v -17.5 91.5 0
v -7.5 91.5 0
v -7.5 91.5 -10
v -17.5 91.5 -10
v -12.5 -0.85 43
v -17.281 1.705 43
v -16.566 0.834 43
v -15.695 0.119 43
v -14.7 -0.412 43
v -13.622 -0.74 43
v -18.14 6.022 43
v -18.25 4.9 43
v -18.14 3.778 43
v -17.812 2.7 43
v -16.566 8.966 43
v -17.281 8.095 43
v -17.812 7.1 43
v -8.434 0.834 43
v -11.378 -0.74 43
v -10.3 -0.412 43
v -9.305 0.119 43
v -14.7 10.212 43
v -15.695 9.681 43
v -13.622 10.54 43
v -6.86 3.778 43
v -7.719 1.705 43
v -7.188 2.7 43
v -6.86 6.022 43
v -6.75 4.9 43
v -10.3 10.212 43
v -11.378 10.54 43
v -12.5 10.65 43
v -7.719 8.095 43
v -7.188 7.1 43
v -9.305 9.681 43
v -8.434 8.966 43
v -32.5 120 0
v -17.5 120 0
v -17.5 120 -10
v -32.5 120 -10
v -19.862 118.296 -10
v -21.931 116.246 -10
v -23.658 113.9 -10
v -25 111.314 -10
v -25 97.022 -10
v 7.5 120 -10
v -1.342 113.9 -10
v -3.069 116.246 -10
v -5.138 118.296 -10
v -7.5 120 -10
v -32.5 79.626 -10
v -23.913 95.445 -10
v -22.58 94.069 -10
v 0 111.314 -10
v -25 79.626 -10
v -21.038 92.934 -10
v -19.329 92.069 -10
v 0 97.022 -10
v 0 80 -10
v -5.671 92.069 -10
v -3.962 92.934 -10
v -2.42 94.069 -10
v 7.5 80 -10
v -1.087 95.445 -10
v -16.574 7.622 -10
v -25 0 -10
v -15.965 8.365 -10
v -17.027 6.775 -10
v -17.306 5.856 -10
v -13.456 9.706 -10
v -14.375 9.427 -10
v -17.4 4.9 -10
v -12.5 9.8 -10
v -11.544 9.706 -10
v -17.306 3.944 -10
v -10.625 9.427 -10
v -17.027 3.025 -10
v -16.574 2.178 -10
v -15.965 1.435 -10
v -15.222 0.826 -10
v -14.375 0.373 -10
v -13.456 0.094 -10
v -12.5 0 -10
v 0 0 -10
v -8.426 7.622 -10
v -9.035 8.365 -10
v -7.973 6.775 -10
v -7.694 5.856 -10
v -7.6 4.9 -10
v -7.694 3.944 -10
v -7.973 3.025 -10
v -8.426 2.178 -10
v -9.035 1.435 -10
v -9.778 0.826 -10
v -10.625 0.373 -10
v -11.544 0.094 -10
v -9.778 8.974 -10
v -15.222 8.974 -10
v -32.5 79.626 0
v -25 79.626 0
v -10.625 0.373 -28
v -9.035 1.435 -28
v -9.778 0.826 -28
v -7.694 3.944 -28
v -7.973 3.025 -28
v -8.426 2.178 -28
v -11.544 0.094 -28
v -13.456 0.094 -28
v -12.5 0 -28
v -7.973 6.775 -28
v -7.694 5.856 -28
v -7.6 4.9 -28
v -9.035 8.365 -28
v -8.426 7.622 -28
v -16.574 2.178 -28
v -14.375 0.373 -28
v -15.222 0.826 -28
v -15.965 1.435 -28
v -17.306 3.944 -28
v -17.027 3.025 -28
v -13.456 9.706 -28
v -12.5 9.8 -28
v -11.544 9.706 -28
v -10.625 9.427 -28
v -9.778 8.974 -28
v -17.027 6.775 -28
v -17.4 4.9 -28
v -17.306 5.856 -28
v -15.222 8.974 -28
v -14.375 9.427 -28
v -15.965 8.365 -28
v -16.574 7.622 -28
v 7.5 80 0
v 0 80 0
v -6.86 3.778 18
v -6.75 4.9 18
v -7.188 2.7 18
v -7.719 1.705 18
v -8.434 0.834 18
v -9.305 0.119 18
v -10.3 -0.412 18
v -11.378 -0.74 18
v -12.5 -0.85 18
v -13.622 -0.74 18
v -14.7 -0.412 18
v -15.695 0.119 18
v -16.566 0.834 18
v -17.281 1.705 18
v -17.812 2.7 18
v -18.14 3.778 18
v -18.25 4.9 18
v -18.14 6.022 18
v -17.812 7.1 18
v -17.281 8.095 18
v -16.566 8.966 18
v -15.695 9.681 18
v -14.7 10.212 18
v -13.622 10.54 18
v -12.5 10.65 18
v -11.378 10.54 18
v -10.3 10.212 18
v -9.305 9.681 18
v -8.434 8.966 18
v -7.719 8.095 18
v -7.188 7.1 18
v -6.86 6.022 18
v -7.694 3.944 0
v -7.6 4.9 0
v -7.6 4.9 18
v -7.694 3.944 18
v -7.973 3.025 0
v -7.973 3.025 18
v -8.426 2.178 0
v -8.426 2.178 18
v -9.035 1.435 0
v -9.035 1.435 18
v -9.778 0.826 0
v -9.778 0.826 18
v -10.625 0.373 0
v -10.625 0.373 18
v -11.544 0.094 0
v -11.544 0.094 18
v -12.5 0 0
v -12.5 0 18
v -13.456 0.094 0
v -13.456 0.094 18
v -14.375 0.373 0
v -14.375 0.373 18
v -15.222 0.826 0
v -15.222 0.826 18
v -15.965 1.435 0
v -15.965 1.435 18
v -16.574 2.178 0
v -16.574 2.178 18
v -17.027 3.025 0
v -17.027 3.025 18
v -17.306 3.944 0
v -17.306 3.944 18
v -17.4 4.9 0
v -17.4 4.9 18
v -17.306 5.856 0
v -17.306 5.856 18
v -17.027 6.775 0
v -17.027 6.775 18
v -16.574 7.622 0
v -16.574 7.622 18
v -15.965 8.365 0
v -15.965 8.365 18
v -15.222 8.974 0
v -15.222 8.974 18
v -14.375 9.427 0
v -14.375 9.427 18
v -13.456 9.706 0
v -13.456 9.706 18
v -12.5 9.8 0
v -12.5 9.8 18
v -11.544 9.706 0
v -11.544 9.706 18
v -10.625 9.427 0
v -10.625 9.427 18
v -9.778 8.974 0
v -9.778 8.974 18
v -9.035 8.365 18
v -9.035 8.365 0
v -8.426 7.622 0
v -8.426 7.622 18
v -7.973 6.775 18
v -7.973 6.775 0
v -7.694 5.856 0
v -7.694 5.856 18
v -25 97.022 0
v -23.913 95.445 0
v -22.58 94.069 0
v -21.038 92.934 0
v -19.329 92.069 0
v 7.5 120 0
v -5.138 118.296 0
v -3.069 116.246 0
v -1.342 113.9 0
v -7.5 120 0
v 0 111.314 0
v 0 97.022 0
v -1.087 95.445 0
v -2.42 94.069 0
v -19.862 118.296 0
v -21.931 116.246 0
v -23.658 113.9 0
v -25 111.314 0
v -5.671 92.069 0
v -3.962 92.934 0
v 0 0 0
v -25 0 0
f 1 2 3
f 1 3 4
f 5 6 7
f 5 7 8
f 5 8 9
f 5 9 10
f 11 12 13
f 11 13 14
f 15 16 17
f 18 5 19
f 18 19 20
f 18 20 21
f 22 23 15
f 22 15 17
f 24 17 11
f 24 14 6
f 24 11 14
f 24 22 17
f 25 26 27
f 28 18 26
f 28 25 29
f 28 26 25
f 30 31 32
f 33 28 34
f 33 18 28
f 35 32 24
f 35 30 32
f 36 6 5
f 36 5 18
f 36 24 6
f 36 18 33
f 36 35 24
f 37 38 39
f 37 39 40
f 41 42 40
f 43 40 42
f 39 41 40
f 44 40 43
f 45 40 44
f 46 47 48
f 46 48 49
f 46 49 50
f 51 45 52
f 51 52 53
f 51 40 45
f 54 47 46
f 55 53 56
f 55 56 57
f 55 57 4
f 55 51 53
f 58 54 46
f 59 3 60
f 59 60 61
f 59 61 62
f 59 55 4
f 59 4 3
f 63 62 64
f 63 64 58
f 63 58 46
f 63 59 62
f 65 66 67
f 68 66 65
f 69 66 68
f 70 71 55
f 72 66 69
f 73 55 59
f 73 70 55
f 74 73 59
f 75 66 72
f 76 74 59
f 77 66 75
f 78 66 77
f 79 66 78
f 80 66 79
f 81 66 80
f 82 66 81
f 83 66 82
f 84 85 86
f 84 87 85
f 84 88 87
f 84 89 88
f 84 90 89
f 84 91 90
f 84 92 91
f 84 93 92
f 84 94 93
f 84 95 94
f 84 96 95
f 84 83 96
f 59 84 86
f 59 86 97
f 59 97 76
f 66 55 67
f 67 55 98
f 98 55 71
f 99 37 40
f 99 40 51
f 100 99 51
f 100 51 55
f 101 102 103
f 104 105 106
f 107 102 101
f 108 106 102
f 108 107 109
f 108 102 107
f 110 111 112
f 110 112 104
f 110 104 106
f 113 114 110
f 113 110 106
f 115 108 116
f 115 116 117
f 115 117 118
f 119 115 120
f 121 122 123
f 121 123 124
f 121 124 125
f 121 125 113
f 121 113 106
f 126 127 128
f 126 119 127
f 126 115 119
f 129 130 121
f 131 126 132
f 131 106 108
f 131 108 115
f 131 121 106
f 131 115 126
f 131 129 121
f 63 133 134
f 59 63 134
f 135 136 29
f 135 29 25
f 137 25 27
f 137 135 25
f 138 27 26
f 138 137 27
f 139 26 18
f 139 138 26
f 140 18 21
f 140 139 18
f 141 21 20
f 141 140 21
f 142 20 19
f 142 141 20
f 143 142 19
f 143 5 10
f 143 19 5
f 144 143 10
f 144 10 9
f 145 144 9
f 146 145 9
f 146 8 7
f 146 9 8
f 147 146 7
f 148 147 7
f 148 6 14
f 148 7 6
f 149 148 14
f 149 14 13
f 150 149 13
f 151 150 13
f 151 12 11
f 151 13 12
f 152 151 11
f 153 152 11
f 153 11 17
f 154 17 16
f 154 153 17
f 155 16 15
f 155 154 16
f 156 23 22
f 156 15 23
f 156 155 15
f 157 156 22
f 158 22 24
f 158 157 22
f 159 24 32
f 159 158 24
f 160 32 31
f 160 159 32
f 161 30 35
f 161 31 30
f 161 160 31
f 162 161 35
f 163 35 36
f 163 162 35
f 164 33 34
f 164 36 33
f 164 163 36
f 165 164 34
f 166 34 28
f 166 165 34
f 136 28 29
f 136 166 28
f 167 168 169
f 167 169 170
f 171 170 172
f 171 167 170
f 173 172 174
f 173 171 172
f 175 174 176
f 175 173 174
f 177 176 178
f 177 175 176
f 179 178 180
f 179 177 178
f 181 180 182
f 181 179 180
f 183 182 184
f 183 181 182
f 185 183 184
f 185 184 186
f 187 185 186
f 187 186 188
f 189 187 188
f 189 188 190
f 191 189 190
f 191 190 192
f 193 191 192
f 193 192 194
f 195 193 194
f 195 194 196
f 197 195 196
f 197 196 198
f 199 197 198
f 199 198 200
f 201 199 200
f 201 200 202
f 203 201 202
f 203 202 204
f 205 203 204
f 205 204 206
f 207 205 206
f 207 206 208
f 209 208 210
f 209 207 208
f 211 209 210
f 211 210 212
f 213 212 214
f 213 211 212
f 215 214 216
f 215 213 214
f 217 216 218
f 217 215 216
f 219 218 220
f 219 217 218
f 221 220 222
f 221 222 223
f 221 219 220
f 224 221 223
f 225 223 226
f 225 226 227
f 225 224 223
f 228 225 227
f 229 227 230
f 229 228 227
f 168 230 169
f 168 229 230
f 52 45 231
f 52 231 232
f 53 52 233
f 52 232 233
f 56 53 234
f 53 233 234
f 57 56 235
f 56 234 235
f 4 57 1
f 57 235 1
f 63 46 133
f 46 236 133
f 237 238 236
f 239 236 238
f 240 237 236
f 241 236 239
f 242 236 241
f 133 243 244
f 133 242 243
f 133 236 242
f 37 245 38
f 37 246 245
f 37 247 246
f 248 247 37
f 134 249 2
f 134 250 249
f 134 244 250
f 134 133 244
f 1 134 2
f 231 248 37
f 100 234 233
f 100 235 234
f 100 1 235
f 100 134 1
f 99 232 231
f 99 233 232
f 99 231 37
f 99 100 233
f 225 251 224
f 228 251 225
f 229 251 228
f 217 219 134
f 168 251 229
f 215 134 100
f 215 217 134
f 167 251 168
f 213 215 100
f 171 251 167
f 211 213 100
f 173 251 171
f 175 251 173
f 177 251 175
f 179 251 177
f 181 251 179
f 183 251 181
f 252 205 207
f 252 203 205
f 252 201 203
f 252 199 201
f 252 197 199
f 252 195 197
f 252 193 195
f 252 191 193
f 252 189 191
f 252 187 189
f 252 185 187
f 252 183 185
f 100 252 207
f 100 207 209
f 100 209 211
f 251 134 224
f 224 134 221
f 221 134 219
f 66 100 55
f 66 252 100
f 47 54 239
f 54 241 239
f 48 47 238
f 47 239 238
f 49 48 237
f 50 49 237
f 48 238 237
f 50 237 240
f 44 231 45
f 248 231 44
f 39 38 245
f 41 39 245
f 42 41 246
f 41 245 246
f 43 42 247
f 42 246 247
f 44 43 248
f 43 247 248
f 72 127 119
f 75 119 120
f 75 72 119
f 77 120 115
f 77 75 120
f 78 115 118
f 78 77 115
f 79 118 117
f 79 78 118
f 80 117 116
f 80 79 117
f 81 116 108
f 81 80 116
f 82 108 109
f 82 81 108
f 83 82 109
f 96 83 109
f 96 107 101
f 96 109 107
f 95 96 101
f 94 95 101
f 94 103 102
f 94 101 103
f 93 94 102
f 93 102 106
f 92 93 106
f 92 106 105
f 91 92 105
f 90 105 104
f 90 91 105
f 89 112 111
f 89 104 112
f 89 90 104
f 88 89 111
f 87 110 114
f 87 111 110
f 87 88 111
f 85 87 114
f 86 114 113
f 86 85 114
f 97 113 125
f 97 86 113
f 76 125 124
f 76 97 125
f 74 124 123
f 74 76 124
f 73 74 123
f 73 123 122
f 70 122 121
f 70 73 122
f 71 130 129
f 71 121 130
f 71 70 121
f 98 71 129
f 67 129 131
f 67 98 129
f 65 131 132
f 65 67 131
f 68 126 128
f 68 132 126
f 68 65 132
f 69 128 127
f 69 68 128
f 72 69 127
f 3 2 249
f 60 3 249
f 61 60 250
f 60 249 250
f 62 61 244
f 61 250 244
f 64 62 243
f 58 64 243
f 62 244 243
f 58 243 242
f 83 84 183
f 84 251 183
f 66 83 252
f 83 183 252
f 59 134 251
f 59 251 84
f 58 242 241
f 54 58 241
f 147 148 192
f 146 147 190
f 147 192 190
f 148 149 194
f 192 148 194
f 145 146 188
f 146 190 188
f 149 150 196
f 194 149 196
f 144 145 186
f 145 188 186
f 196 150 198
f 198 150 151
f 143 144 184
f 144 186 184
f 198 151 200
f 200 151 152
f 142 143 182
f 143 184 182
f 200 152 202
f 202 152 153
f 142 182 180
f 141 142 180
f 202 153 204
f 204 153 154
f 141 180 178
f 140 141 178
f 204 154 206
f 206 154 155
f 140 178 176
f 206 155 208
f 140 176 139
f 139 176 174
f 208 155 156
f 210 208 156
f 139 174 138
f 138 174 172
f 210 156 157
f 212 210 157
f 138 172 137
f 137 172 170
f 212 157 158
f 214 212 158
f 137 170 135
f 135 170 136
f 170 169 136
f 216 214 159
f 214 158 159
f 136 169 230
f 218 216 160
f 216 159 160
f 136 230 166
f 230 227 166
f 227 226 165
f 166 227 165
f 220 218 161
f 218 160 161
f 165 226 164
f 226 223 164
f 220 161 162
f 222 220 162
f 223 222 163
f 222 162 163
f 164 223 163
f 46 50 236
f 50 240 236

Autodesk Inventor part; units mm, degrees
ref_plane "YZ Plane" through (0, 0, 0) normal (1, 0, 0) x (0, 1, 0)
ref_plane "XZ Plane" through (0, 0, 0) normal (0, 1, 0) x (-1, 0, 0)
ref_plane "XY Plane" through (0, 0, 0) normal (0, 0, 1) x (1, 0, 0)
sketch "Sketch1" plane through (0, 0, 0) normal (0, 1, 0) x (-1, 0, 0)
  line L0 (0, 0) -> (0, -10)
  line L1 (0, 0) -> (25, 0)
  line L2 (25, 0) -> (25, -10)
  line L3 (25, -10) -> (0, -10)
  dimension "d0" = 10
  dimension "d1" = 25
  dimension "d2" = 10
extrude "Extrusion1" add sketch "Sketch1" along normal blind 120
sketch "Sketch2" plane through (-25, 0, 0) normal (0, 0, 1) x (1, 0, 0)
  line L0 (25, 0) -> (0, 0) projected
  line L1 (12.5, 0) -> (17.5, 0)
  line L2 (17.5, 0) -> (12.5, 0)
  line L3 (12.5, 0) -> (12.5, 4.9)
  circle A0 centre (12.5, 4.9) radius 4.9
  dimension "d5" = 5
  dimension "d6" = 4.9
extrude "Extrusion2" add sketch "Sketch2" along normal blind 18
sketch "Sketch3" plane through (-25, 120, 0) normal (0, 0, 1) x (1, 0, 0)
  line L0 (12.5, -120) -> (20.5, -120)
  line L1 (12.5, -120) -> (25, -120) projected
  dimension "d9" = 8
sketch "Sketch4" plane through (0, 0, 0) normal (1, 0, 0) x (0, 0, -1)
  point P0 (0, 0)
sketch "Sketch5" plane through (0, 0, 0) normal (1, 0, 0) x (0, 0, -1)
  point P0 (0, 0)
sketch "Sketch6" plane through (0, 0, 0) normal (1, 0, 0) x (0, 0, -1)
  point P0 (0, 0)
sketch "Sketch7" plane through (0, 0, 0) normal (1, 0, 0) x (0, 0, -1)
  point P0 (0, 0)
sketch "Sketch8" plane through (0, 0, -10) normal (0, 0, -1) x (-1, 0, 0)
  circle A0 centre (12.5, 4.9) radius 4.9 projected
  circle A1 centre (12.5, 4.9) radius 4.9
  point P0 (0, 0)
  point P1 (12.5, 0)
extrude "Extrusion3" add sketch "Sketch8" along normal blind 18
sketch "Sketch9" plane through (-12.5, 4.9, 18) normal (0, 0, 1) x (1, 0, 0)
  circle A0 centre (0, 0) radius 5.75
  point P0 (12.5, -4.9)
  dimension "d12" = 11.5
extrude "Extrusion4" add sketch "Sketch9" along normal blind 25
sketch "Sketch10" plane through (-25, 120, 0) normal (0, 0, 1) x (1, 0, 0)
  line L0 (0, 0) -> (25, 0) projected
  line L1 (12.5, 0) -> (12.5, -28.5)
  line L2 (12.5, -28.5) -> (-0.5, -28.5)
  line L3 (-0.5, -28.5) -> (12.5, -28.5)
  line L4 (12.5, -28.5) -> (25.5, -28.5)
  line L5 (25.5, -28.5) -> (25.5, 0)
  line L6 (25.5, 0) -> (-0.5, 0)
  line L7 (-0.5, 0) -> (-0.5, -28.5)
  line L8 (12.5, 0) -> (7.5, 0)
  line L9 (7.5, 0) -> (17.5, 0)
  line L10 (25.5, 0) -> (25.5, -10)
  line L11 (25.5, -10) -> (25.5, -22)
  line L12 (-0.5, 0) -> (-0.5, -10)
  line L13 (-0.5, -10) -> (-0.5, -22)
  arc A0 (7.5, 0) -> (-0.5, -22) centre (17.25, -16) ccw
  arc A1 (-0.5, -22) -> (12.5, -28.5) centre (10, -17.25) ccw
  line L14 (7.5, 0) -> (12.5, 0)
  arc A2 (25.5, -22) -> (17.5, 0) centre (7.75, -16) ccw
  arc A3 (12.5, -28.5) -> (25.5, -22) centre (15, -17.25) ccw
  line L15 (7.5, 0) -> (-7.5, 0)
  line L16 (-7.5, 0) -> (-7.5, -34)
  line L17 (-7.5, -34) -> (25, -34)
  line L18 (25, -120) -> (25, 0) projected
  line L19 (25, -34) -> (32.5, -34)
  line L20 (32.5, 0) -> (25, 0)
  line L21 (25, 0) -> (17.5, 0)
  line L22 (17.5, 0) -> (32.5, 0)
  line L23 (32.5, 0) -> (32.5, -34)
  point P0 (7.5, -28.5)
  point P1 (17.5, -28.5)
  point P2 (25, -22.9782)
  point P3 (25, -8.6856)
  dimension "d15" = 28.5
  dimension "d16" = 13
  dimension "d17" = 13
  dimension "d18" = 13
  dimension "d19" = 5
  dimension "d20" = 10
  dimension "d21" = 10
  dimension "d22" = 12
  dimension "d23" = 10
  dimension "d24" = 12
  dimension "d25" = 15
  dimension "d26" = 34
  dimension "d28" = 15
extrude "Extrusion5" cut sketch "Sketch10" against normal blind 10 contours L0 L1 L2 A1 L7 A0 | L0 A2 L18 A3 L4 L1
sketch "Sketch11" plane through (-25, 0, 0) normal (0, 0, 1) x (1, 0, 0)
  point P0 (25, 0)
sketch "Sketch12" plane through (-7.5, 120, 0) normal (0, 0, 1) x (1, 0, 0)
  line L0 (7.5, 0) -> (0, 0) projected
  line L1 (0, 0) -> (15, 0)
  line L2 (15, 0) -> (15, -40)
  line L3 (15, -40) -> (7.5, -40)
  line L4 (7.5, -120) -> (7.5, -22.9782) projected
  line L5 (7.5, -8.6856) -> (7.5, 0) projected
  line L6 (7.5, -40) -> (7.5, 0)
  line L7 (-10, 0) -> (-17.5, 0) projected
  line L8 (7.5, 0) -> (-17.5, 0)
  line L9 (-10, 0) -> (-25, 0)
  line L10 (-25, 0) -> (-25, -40.3744)
  line L11 (-25, -40.3744) -> (-17.5, -40.3744)
  line L12 (-17.5, -120) -> (-17.5, -22.9782) projected
  line L13 (-17.5, -8.6856) -> (-17.5, 0) projected
  line L14 (-17.5, -40.3744) -> (-17.5, 0)
  dimension "d31" = 15
  dimension "d32" = 40
  dimension "d33" = 15
extrude "Extrusion6" add sketch "Sketch12" against normal blind 10
ref_plane "Work Plane1" through (-12.5, 0, 0) normal (1, 0, 0) x (0, 0, -1)
properties part number "brazo2"
